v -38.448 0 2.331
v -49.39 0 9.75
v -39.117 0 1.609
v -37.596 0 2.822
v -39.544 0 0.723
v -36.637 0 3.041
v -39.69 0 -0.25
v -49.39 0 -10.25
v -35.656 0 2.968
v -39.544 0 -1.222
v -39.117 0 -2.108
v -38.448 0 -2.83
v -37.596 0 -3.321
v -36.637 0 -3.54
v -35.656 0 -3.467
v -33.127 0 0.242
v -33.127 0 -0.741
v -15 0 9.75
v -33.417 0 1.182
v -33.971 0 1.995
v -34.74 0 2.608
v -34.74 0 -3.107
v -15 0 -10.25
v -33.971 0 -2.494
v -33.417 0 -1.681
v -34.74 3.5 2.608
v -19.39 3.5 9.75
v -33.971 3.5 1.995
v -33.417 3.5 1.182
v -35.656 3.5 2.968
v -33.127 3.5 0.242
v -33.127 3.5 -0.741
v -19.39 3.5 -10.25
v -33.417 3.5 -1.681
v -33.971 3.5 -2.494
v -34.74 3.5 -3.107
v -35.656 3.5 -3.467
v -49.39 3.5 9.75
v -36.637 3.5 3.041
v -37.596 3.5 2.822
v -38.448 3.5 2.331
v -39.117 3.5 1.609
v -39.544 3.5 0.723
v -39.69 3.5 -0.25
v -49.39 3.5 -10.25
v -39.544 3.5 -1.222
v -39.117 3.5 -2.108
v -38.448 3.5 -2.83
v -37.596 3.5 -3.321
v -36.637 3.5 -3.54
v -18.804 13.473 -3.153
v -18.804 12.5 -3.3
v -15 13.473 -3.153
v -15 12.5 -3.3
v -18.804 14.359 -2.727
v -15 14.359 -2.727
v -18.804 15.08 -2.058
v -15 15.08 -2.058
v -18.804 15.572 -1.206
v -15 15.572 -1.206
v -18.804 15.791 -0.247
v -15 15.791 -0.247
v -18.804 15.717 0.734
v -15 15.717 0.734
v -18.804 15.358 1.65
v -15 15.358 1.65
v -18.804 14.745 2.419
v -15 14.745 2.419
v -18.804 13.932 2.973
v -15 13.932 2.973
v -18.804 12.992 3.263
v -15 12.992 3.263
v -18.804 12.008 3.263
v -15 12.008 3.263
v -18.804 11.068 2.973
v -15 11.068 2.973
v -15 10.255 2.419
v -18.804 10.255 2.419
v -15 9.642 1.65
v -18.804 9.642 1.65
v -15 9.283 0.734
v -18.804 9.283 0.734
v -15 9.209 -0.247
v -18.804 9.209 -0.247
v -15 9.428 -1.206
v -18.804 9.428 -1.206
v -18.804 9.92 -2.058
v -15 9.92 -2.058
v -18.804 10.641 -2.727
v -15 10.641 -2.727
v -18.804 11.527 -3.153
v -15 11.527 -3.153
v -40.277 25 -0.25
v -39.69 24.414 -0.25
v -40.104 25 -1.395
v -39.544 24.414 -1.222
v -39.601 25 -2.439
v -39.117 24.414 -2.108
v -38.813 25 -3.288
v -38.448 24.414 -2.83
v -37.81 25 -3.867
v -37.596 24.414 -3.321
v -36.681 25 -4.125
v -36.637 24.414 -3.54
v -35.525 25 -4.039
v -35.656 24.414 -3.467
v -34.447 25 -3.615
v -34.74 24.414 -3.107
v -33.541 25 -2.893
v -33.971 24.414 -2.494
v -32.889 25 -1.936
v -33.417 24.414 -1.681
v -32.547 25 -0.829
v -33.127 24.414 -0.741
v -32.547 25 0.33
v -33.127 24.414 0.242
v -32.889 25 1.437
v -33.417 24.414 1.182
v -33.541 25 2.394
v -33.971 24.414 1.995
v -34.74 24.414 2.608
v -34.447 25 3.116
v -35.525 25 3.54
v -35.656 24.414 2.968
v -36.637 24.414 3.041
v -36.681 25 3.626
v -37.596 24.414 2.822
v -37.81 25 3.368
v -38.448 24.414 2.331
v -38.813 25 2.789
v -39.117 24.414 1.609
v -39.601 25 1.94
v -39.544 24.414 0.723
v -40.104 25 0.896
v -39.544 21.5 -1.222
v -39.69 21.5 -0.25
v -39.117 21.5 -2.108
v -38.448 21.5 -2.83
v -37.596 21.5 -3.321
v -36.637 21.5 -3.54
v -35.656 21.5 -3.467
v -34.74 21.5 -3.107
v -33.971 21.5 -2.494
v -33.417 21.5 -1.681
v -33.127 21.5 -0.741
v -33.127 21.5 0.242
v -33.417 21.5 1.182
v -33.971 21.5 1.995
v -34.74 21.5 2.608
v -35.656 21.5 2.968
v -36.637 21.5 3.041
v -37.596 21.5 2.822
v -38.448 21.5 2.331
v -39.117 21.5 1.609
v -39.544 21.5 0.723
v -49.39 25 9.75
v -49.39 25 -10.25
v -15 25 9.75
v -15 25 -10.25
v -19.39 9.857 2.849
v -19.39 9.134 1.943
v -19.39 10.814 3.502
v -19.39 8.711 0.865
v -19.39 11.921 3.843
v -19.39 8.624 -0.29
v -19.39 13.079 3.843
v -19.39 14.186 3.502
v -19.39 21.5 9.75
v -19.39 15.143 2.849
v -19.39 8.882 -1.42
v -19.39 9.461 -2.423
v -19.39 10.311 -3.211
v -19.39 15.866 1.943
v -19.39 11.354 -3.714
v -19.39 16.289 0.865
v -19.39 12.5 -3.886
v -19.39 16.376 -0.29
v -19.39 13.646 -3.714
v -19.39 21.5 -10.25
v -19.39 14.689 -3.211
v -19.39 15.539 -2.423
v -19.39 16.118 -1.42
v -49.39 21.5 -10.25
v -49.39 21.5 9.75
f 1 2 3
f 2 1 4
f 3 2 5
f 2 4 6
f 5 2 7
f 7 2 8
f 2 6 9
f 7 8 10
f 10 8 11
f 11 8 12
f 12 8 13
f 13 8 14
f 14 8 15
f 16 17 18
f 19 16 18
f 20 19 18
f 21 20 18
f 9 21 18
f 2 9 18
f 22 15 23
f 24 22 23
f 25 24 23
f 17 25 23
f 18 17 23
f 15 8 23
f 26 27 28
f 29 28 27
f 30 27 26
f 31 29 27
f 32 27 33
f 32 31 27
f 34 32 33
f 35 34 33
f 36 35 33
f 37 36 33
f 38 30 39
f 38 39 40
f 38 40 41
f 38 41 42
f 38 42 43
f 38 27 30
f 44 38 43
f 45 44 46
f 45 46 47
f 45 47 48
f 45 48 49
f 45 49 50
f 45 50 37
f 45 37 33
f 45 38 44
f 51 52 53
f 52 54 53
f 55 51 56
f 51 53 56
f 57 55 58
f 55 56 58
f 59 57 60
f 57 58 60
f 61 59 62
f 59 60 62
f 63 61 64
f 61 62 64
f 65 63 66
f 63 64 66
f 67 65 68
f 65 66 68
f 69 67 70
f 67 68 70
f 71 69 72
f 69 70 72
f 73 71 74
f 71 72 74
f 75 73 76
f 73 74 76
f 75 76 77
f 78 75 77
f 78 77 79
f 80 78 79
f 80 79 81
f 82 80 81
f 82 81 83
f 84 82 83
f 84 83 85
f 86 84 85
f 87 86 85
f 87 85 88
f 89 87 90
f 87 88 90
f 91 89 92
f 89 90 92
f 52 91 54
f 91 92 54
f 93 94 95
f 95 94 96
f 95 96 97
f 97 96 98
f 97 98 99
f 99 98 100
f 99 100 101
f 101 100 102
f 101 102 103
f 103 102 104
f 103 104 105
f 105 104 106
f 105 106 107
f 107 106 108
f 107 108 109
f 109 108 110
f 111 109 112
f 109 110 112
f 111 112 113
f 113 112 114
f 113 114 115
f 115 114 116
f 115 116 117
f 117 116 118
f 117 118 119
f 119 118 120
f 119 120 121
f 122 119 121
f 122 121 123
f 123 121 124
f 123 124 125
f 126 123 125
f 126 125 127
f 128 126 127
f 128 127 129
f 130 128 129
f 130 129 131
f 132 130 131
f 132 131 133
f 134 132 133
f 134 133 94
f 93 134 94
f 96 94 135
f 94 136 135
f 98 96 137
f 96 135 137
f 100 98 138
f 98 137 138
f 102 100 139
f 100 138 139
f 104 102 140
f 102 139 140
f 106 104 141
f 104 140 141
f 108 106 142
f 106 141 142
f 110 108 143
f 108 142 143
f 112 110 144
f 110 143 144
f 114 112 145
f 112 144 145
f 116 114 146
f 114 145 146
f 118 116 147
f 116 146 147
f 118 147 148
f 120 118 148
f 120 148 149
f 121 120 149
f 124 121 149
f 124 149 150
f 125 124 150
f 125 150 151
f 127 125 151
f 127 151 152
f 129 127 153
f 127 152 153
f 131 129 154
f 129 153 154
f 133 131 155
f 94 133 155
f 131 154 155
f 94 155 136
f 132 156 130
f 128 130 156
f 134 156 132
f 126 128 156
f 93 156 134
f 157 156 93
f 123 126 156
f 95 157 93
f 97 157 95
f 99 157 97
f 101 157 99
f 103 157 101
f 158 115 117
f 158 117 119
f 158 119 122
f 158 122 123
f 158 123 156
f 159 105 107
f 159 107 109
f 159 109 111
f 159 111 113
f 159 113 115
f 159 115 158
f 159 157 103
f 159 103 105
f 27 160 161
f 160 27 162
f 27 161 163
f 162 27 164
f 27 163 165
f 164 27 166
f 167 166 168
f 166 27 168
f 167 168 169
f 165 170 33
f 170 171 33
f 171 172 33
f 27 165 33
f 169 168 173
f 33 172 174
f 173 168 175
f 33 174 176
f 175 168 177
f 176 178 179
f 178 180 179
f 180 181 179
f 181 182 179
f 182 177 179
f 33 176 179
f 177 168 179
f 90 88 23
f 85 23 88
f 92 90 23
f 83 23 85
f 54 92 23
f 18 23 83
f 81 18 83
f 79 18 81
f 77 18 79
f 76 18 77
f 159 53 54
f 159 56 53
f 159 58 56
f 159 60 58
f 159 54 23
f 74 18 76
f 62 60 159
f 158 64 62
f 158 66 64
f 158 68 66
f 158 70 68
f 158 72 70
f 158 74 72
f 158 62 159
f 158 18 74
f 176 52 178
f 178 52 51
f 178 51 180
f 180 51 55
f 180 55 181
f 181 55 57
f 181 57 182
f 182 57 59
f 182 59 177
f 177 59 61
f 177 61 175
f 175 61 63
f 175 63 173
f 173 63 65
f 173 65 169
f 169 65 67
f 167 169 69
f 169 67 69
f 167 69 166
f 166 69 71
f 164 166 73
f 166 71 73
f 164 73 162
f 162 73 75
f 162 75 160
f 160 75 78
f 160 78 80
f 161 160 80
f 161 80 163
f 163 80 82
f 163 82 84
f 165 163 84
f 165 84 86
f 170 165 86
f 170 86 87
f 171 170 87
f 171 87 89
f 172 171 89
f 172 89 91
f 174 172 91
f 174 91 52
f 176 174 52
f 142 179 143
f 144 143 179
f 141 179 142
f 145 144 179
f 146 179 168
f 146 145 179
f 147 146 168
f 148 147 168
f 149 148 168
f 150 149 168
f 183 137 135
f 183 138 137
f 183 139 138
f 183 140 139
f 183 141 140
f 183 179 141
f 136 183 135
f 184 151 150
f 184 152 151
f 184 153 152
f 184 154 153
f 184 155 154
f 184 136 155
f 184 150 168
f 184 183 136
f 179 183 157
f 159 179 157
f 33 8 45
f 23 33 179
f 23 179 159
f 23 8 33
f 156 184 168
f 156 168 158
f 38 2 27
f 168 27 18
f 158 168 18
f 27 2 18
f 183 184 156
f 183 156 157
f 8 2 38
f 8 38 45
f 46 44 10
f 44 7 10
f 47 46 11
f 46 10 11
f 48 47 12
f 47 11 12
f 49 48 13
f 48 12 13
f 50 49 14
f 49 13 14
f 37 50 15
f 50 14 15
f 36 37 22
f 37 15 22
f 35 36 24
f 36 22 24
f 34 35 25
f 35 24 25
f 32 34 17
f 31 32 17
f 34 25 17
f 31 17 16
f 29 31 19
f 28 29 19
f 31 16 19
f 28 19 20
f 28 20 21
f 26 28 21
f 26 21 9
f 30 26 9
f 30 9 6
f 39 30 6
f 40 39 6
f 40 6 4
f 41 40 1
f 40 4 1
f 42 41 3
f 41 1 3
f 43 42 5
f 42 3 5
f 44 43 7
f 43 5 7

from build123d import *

# Parameters (mm, degrees)
SKETCH_1_W                      = 120
SKETCH_1_H                      = 20
EXTRUDE_1_DEPTH                 = 25
CUT_EXTRUDE_1_DEPTH             = 30
SKETCH_3_W                      = 15
SKETCH_3_H                      = 25
SKETCH_3_W_2                    = 70.609699787
CUT_EXTRUDE_2_DEPTH             = 30
HOLE_WIZARD_G1_16_1_D           = 6.6
HOLE_WIZARD_G1_16_1_DEPTH       = 30
HOLE_WIZARD_G1_16_1_CSINK_D     = 7.773
HOLE_WIZARD_G1_16_1_CSINK_ANGLE = 90
HOLE_WIZARD_G1_16_1_TIP         = 1.982840043
HOLE_WIZARD_G1_16_2_D           = 6.6
HOLE_WIZARD_G1_16_2_DEPTH       = 30
HOLE_WIZARD_G1_16_2_CSINK_D     = 7.773
HOLE_WIZARD_G1_16_2_CSINK_ANGLE = 90
HOLE_WIZARD_G1_16_2_TIP         = 1.982840043


with BuildPart() as part:
    # 草图1 → 凸台-拉伸1 (new body)
    with BuildSketch(Plane(origin=(0, 0, 0), x_dir=(1, 0, 0), z_dir=(0, 1, 0))):
        with Locations((10.609699787, 0.249516379)):
            Rectangle(SKETCH_1_W, SKETCH_1_H)
    extrude(amount=EXTRUDE_1_DEPTH)

    # 草图2 → 切除-拉伸1 (cut)
    with BuildSketch(Plane.ZY.offset(49.390300213)):
        Polygon((-10.249516379, 12.5), (-10.249516379, 21.5), (9.750483621, 21.5), (9.750483621, 3.5), (-10.249516379, 3.5), align=None)
    extrude(amount=-CUT_EXTRUDE_1_DEPTH, mode=Mode.SUBTRACT)

    # 草图3 → 切除-拉伸2 (cut)
    with BuildSketch(Plane.XY.offset(9.750483621)):
        with Locations((-7.5, 12.5)):
            Rectangle(SKETCH_3_W, SKETCH_3_H)
        with Locations((35.304849894, 12.5)):
            Rectangle(SKETCH_3_W_2, SKETCH_3_H)
    extrude(amount=-CUT_EXTRUDE_2_DEPTH, mode=Mode.SUBTRACT)

    # G1/16 螺纹孔1
    with Locations(Plane(origin=(0, 25, 0), x_dir=(1, 0, 0), z_dir=(0, 1, 0))):
        with Locations((-36.390300213, 0.249516379)):
            CounterSinkHole(HOLE_WIZARD_G1_16_1_D / 2, HOLE_WIZARD_G1_16_1_CSINK_D / 2, depth=HOLE_WIZARD_G1_16_1_DEPTH, counter_sink_angle=HOLE_WIZARD_G1_16_1_CSINK_ANGLE)
            with Locations((0, 0, -(HOLE_WIZARD_G1_16_1_DEPTH + HOLE_WIZARD_G1_16_1_TIP / 2))):  # 118° drill point
                Cone(0, HOLE_WIZARD_G1_16_1_D / 2, HOLE_WIZARD_G1_16_1_TIP, mode=Mode.SUBTRACT)

    # G1/16 螺纹孔2
    with Locations(Plane.ZY.offset(19.390300213)):
        with Locations((0, 12.5)):
            CounterSinkHole(HOLE_WIZARD_G1_16_2_D / 2, HOLE_WIZARD_G1_16_2_CSINK_D / 2, depth=HOLE_WIZARD_G1_16_2_DEPTH, counter_sink_angle=HOLE_WIZARD_G1_16_2_CSINK_ANGLE)
            with Locations((0, 0, -(HOLE_WIZARD_G1_16_2_DEPTH + HOLE_WIZARD_G1_16_2_TIP / 2))):  # 118° drill point
                Cone(0, HOLE_WIZARD_G1_16_2_D / 2, HOLE_WIZARD_G1_16_2_TIP, mode=Mode.SUBTRACT)


solid = part.part
